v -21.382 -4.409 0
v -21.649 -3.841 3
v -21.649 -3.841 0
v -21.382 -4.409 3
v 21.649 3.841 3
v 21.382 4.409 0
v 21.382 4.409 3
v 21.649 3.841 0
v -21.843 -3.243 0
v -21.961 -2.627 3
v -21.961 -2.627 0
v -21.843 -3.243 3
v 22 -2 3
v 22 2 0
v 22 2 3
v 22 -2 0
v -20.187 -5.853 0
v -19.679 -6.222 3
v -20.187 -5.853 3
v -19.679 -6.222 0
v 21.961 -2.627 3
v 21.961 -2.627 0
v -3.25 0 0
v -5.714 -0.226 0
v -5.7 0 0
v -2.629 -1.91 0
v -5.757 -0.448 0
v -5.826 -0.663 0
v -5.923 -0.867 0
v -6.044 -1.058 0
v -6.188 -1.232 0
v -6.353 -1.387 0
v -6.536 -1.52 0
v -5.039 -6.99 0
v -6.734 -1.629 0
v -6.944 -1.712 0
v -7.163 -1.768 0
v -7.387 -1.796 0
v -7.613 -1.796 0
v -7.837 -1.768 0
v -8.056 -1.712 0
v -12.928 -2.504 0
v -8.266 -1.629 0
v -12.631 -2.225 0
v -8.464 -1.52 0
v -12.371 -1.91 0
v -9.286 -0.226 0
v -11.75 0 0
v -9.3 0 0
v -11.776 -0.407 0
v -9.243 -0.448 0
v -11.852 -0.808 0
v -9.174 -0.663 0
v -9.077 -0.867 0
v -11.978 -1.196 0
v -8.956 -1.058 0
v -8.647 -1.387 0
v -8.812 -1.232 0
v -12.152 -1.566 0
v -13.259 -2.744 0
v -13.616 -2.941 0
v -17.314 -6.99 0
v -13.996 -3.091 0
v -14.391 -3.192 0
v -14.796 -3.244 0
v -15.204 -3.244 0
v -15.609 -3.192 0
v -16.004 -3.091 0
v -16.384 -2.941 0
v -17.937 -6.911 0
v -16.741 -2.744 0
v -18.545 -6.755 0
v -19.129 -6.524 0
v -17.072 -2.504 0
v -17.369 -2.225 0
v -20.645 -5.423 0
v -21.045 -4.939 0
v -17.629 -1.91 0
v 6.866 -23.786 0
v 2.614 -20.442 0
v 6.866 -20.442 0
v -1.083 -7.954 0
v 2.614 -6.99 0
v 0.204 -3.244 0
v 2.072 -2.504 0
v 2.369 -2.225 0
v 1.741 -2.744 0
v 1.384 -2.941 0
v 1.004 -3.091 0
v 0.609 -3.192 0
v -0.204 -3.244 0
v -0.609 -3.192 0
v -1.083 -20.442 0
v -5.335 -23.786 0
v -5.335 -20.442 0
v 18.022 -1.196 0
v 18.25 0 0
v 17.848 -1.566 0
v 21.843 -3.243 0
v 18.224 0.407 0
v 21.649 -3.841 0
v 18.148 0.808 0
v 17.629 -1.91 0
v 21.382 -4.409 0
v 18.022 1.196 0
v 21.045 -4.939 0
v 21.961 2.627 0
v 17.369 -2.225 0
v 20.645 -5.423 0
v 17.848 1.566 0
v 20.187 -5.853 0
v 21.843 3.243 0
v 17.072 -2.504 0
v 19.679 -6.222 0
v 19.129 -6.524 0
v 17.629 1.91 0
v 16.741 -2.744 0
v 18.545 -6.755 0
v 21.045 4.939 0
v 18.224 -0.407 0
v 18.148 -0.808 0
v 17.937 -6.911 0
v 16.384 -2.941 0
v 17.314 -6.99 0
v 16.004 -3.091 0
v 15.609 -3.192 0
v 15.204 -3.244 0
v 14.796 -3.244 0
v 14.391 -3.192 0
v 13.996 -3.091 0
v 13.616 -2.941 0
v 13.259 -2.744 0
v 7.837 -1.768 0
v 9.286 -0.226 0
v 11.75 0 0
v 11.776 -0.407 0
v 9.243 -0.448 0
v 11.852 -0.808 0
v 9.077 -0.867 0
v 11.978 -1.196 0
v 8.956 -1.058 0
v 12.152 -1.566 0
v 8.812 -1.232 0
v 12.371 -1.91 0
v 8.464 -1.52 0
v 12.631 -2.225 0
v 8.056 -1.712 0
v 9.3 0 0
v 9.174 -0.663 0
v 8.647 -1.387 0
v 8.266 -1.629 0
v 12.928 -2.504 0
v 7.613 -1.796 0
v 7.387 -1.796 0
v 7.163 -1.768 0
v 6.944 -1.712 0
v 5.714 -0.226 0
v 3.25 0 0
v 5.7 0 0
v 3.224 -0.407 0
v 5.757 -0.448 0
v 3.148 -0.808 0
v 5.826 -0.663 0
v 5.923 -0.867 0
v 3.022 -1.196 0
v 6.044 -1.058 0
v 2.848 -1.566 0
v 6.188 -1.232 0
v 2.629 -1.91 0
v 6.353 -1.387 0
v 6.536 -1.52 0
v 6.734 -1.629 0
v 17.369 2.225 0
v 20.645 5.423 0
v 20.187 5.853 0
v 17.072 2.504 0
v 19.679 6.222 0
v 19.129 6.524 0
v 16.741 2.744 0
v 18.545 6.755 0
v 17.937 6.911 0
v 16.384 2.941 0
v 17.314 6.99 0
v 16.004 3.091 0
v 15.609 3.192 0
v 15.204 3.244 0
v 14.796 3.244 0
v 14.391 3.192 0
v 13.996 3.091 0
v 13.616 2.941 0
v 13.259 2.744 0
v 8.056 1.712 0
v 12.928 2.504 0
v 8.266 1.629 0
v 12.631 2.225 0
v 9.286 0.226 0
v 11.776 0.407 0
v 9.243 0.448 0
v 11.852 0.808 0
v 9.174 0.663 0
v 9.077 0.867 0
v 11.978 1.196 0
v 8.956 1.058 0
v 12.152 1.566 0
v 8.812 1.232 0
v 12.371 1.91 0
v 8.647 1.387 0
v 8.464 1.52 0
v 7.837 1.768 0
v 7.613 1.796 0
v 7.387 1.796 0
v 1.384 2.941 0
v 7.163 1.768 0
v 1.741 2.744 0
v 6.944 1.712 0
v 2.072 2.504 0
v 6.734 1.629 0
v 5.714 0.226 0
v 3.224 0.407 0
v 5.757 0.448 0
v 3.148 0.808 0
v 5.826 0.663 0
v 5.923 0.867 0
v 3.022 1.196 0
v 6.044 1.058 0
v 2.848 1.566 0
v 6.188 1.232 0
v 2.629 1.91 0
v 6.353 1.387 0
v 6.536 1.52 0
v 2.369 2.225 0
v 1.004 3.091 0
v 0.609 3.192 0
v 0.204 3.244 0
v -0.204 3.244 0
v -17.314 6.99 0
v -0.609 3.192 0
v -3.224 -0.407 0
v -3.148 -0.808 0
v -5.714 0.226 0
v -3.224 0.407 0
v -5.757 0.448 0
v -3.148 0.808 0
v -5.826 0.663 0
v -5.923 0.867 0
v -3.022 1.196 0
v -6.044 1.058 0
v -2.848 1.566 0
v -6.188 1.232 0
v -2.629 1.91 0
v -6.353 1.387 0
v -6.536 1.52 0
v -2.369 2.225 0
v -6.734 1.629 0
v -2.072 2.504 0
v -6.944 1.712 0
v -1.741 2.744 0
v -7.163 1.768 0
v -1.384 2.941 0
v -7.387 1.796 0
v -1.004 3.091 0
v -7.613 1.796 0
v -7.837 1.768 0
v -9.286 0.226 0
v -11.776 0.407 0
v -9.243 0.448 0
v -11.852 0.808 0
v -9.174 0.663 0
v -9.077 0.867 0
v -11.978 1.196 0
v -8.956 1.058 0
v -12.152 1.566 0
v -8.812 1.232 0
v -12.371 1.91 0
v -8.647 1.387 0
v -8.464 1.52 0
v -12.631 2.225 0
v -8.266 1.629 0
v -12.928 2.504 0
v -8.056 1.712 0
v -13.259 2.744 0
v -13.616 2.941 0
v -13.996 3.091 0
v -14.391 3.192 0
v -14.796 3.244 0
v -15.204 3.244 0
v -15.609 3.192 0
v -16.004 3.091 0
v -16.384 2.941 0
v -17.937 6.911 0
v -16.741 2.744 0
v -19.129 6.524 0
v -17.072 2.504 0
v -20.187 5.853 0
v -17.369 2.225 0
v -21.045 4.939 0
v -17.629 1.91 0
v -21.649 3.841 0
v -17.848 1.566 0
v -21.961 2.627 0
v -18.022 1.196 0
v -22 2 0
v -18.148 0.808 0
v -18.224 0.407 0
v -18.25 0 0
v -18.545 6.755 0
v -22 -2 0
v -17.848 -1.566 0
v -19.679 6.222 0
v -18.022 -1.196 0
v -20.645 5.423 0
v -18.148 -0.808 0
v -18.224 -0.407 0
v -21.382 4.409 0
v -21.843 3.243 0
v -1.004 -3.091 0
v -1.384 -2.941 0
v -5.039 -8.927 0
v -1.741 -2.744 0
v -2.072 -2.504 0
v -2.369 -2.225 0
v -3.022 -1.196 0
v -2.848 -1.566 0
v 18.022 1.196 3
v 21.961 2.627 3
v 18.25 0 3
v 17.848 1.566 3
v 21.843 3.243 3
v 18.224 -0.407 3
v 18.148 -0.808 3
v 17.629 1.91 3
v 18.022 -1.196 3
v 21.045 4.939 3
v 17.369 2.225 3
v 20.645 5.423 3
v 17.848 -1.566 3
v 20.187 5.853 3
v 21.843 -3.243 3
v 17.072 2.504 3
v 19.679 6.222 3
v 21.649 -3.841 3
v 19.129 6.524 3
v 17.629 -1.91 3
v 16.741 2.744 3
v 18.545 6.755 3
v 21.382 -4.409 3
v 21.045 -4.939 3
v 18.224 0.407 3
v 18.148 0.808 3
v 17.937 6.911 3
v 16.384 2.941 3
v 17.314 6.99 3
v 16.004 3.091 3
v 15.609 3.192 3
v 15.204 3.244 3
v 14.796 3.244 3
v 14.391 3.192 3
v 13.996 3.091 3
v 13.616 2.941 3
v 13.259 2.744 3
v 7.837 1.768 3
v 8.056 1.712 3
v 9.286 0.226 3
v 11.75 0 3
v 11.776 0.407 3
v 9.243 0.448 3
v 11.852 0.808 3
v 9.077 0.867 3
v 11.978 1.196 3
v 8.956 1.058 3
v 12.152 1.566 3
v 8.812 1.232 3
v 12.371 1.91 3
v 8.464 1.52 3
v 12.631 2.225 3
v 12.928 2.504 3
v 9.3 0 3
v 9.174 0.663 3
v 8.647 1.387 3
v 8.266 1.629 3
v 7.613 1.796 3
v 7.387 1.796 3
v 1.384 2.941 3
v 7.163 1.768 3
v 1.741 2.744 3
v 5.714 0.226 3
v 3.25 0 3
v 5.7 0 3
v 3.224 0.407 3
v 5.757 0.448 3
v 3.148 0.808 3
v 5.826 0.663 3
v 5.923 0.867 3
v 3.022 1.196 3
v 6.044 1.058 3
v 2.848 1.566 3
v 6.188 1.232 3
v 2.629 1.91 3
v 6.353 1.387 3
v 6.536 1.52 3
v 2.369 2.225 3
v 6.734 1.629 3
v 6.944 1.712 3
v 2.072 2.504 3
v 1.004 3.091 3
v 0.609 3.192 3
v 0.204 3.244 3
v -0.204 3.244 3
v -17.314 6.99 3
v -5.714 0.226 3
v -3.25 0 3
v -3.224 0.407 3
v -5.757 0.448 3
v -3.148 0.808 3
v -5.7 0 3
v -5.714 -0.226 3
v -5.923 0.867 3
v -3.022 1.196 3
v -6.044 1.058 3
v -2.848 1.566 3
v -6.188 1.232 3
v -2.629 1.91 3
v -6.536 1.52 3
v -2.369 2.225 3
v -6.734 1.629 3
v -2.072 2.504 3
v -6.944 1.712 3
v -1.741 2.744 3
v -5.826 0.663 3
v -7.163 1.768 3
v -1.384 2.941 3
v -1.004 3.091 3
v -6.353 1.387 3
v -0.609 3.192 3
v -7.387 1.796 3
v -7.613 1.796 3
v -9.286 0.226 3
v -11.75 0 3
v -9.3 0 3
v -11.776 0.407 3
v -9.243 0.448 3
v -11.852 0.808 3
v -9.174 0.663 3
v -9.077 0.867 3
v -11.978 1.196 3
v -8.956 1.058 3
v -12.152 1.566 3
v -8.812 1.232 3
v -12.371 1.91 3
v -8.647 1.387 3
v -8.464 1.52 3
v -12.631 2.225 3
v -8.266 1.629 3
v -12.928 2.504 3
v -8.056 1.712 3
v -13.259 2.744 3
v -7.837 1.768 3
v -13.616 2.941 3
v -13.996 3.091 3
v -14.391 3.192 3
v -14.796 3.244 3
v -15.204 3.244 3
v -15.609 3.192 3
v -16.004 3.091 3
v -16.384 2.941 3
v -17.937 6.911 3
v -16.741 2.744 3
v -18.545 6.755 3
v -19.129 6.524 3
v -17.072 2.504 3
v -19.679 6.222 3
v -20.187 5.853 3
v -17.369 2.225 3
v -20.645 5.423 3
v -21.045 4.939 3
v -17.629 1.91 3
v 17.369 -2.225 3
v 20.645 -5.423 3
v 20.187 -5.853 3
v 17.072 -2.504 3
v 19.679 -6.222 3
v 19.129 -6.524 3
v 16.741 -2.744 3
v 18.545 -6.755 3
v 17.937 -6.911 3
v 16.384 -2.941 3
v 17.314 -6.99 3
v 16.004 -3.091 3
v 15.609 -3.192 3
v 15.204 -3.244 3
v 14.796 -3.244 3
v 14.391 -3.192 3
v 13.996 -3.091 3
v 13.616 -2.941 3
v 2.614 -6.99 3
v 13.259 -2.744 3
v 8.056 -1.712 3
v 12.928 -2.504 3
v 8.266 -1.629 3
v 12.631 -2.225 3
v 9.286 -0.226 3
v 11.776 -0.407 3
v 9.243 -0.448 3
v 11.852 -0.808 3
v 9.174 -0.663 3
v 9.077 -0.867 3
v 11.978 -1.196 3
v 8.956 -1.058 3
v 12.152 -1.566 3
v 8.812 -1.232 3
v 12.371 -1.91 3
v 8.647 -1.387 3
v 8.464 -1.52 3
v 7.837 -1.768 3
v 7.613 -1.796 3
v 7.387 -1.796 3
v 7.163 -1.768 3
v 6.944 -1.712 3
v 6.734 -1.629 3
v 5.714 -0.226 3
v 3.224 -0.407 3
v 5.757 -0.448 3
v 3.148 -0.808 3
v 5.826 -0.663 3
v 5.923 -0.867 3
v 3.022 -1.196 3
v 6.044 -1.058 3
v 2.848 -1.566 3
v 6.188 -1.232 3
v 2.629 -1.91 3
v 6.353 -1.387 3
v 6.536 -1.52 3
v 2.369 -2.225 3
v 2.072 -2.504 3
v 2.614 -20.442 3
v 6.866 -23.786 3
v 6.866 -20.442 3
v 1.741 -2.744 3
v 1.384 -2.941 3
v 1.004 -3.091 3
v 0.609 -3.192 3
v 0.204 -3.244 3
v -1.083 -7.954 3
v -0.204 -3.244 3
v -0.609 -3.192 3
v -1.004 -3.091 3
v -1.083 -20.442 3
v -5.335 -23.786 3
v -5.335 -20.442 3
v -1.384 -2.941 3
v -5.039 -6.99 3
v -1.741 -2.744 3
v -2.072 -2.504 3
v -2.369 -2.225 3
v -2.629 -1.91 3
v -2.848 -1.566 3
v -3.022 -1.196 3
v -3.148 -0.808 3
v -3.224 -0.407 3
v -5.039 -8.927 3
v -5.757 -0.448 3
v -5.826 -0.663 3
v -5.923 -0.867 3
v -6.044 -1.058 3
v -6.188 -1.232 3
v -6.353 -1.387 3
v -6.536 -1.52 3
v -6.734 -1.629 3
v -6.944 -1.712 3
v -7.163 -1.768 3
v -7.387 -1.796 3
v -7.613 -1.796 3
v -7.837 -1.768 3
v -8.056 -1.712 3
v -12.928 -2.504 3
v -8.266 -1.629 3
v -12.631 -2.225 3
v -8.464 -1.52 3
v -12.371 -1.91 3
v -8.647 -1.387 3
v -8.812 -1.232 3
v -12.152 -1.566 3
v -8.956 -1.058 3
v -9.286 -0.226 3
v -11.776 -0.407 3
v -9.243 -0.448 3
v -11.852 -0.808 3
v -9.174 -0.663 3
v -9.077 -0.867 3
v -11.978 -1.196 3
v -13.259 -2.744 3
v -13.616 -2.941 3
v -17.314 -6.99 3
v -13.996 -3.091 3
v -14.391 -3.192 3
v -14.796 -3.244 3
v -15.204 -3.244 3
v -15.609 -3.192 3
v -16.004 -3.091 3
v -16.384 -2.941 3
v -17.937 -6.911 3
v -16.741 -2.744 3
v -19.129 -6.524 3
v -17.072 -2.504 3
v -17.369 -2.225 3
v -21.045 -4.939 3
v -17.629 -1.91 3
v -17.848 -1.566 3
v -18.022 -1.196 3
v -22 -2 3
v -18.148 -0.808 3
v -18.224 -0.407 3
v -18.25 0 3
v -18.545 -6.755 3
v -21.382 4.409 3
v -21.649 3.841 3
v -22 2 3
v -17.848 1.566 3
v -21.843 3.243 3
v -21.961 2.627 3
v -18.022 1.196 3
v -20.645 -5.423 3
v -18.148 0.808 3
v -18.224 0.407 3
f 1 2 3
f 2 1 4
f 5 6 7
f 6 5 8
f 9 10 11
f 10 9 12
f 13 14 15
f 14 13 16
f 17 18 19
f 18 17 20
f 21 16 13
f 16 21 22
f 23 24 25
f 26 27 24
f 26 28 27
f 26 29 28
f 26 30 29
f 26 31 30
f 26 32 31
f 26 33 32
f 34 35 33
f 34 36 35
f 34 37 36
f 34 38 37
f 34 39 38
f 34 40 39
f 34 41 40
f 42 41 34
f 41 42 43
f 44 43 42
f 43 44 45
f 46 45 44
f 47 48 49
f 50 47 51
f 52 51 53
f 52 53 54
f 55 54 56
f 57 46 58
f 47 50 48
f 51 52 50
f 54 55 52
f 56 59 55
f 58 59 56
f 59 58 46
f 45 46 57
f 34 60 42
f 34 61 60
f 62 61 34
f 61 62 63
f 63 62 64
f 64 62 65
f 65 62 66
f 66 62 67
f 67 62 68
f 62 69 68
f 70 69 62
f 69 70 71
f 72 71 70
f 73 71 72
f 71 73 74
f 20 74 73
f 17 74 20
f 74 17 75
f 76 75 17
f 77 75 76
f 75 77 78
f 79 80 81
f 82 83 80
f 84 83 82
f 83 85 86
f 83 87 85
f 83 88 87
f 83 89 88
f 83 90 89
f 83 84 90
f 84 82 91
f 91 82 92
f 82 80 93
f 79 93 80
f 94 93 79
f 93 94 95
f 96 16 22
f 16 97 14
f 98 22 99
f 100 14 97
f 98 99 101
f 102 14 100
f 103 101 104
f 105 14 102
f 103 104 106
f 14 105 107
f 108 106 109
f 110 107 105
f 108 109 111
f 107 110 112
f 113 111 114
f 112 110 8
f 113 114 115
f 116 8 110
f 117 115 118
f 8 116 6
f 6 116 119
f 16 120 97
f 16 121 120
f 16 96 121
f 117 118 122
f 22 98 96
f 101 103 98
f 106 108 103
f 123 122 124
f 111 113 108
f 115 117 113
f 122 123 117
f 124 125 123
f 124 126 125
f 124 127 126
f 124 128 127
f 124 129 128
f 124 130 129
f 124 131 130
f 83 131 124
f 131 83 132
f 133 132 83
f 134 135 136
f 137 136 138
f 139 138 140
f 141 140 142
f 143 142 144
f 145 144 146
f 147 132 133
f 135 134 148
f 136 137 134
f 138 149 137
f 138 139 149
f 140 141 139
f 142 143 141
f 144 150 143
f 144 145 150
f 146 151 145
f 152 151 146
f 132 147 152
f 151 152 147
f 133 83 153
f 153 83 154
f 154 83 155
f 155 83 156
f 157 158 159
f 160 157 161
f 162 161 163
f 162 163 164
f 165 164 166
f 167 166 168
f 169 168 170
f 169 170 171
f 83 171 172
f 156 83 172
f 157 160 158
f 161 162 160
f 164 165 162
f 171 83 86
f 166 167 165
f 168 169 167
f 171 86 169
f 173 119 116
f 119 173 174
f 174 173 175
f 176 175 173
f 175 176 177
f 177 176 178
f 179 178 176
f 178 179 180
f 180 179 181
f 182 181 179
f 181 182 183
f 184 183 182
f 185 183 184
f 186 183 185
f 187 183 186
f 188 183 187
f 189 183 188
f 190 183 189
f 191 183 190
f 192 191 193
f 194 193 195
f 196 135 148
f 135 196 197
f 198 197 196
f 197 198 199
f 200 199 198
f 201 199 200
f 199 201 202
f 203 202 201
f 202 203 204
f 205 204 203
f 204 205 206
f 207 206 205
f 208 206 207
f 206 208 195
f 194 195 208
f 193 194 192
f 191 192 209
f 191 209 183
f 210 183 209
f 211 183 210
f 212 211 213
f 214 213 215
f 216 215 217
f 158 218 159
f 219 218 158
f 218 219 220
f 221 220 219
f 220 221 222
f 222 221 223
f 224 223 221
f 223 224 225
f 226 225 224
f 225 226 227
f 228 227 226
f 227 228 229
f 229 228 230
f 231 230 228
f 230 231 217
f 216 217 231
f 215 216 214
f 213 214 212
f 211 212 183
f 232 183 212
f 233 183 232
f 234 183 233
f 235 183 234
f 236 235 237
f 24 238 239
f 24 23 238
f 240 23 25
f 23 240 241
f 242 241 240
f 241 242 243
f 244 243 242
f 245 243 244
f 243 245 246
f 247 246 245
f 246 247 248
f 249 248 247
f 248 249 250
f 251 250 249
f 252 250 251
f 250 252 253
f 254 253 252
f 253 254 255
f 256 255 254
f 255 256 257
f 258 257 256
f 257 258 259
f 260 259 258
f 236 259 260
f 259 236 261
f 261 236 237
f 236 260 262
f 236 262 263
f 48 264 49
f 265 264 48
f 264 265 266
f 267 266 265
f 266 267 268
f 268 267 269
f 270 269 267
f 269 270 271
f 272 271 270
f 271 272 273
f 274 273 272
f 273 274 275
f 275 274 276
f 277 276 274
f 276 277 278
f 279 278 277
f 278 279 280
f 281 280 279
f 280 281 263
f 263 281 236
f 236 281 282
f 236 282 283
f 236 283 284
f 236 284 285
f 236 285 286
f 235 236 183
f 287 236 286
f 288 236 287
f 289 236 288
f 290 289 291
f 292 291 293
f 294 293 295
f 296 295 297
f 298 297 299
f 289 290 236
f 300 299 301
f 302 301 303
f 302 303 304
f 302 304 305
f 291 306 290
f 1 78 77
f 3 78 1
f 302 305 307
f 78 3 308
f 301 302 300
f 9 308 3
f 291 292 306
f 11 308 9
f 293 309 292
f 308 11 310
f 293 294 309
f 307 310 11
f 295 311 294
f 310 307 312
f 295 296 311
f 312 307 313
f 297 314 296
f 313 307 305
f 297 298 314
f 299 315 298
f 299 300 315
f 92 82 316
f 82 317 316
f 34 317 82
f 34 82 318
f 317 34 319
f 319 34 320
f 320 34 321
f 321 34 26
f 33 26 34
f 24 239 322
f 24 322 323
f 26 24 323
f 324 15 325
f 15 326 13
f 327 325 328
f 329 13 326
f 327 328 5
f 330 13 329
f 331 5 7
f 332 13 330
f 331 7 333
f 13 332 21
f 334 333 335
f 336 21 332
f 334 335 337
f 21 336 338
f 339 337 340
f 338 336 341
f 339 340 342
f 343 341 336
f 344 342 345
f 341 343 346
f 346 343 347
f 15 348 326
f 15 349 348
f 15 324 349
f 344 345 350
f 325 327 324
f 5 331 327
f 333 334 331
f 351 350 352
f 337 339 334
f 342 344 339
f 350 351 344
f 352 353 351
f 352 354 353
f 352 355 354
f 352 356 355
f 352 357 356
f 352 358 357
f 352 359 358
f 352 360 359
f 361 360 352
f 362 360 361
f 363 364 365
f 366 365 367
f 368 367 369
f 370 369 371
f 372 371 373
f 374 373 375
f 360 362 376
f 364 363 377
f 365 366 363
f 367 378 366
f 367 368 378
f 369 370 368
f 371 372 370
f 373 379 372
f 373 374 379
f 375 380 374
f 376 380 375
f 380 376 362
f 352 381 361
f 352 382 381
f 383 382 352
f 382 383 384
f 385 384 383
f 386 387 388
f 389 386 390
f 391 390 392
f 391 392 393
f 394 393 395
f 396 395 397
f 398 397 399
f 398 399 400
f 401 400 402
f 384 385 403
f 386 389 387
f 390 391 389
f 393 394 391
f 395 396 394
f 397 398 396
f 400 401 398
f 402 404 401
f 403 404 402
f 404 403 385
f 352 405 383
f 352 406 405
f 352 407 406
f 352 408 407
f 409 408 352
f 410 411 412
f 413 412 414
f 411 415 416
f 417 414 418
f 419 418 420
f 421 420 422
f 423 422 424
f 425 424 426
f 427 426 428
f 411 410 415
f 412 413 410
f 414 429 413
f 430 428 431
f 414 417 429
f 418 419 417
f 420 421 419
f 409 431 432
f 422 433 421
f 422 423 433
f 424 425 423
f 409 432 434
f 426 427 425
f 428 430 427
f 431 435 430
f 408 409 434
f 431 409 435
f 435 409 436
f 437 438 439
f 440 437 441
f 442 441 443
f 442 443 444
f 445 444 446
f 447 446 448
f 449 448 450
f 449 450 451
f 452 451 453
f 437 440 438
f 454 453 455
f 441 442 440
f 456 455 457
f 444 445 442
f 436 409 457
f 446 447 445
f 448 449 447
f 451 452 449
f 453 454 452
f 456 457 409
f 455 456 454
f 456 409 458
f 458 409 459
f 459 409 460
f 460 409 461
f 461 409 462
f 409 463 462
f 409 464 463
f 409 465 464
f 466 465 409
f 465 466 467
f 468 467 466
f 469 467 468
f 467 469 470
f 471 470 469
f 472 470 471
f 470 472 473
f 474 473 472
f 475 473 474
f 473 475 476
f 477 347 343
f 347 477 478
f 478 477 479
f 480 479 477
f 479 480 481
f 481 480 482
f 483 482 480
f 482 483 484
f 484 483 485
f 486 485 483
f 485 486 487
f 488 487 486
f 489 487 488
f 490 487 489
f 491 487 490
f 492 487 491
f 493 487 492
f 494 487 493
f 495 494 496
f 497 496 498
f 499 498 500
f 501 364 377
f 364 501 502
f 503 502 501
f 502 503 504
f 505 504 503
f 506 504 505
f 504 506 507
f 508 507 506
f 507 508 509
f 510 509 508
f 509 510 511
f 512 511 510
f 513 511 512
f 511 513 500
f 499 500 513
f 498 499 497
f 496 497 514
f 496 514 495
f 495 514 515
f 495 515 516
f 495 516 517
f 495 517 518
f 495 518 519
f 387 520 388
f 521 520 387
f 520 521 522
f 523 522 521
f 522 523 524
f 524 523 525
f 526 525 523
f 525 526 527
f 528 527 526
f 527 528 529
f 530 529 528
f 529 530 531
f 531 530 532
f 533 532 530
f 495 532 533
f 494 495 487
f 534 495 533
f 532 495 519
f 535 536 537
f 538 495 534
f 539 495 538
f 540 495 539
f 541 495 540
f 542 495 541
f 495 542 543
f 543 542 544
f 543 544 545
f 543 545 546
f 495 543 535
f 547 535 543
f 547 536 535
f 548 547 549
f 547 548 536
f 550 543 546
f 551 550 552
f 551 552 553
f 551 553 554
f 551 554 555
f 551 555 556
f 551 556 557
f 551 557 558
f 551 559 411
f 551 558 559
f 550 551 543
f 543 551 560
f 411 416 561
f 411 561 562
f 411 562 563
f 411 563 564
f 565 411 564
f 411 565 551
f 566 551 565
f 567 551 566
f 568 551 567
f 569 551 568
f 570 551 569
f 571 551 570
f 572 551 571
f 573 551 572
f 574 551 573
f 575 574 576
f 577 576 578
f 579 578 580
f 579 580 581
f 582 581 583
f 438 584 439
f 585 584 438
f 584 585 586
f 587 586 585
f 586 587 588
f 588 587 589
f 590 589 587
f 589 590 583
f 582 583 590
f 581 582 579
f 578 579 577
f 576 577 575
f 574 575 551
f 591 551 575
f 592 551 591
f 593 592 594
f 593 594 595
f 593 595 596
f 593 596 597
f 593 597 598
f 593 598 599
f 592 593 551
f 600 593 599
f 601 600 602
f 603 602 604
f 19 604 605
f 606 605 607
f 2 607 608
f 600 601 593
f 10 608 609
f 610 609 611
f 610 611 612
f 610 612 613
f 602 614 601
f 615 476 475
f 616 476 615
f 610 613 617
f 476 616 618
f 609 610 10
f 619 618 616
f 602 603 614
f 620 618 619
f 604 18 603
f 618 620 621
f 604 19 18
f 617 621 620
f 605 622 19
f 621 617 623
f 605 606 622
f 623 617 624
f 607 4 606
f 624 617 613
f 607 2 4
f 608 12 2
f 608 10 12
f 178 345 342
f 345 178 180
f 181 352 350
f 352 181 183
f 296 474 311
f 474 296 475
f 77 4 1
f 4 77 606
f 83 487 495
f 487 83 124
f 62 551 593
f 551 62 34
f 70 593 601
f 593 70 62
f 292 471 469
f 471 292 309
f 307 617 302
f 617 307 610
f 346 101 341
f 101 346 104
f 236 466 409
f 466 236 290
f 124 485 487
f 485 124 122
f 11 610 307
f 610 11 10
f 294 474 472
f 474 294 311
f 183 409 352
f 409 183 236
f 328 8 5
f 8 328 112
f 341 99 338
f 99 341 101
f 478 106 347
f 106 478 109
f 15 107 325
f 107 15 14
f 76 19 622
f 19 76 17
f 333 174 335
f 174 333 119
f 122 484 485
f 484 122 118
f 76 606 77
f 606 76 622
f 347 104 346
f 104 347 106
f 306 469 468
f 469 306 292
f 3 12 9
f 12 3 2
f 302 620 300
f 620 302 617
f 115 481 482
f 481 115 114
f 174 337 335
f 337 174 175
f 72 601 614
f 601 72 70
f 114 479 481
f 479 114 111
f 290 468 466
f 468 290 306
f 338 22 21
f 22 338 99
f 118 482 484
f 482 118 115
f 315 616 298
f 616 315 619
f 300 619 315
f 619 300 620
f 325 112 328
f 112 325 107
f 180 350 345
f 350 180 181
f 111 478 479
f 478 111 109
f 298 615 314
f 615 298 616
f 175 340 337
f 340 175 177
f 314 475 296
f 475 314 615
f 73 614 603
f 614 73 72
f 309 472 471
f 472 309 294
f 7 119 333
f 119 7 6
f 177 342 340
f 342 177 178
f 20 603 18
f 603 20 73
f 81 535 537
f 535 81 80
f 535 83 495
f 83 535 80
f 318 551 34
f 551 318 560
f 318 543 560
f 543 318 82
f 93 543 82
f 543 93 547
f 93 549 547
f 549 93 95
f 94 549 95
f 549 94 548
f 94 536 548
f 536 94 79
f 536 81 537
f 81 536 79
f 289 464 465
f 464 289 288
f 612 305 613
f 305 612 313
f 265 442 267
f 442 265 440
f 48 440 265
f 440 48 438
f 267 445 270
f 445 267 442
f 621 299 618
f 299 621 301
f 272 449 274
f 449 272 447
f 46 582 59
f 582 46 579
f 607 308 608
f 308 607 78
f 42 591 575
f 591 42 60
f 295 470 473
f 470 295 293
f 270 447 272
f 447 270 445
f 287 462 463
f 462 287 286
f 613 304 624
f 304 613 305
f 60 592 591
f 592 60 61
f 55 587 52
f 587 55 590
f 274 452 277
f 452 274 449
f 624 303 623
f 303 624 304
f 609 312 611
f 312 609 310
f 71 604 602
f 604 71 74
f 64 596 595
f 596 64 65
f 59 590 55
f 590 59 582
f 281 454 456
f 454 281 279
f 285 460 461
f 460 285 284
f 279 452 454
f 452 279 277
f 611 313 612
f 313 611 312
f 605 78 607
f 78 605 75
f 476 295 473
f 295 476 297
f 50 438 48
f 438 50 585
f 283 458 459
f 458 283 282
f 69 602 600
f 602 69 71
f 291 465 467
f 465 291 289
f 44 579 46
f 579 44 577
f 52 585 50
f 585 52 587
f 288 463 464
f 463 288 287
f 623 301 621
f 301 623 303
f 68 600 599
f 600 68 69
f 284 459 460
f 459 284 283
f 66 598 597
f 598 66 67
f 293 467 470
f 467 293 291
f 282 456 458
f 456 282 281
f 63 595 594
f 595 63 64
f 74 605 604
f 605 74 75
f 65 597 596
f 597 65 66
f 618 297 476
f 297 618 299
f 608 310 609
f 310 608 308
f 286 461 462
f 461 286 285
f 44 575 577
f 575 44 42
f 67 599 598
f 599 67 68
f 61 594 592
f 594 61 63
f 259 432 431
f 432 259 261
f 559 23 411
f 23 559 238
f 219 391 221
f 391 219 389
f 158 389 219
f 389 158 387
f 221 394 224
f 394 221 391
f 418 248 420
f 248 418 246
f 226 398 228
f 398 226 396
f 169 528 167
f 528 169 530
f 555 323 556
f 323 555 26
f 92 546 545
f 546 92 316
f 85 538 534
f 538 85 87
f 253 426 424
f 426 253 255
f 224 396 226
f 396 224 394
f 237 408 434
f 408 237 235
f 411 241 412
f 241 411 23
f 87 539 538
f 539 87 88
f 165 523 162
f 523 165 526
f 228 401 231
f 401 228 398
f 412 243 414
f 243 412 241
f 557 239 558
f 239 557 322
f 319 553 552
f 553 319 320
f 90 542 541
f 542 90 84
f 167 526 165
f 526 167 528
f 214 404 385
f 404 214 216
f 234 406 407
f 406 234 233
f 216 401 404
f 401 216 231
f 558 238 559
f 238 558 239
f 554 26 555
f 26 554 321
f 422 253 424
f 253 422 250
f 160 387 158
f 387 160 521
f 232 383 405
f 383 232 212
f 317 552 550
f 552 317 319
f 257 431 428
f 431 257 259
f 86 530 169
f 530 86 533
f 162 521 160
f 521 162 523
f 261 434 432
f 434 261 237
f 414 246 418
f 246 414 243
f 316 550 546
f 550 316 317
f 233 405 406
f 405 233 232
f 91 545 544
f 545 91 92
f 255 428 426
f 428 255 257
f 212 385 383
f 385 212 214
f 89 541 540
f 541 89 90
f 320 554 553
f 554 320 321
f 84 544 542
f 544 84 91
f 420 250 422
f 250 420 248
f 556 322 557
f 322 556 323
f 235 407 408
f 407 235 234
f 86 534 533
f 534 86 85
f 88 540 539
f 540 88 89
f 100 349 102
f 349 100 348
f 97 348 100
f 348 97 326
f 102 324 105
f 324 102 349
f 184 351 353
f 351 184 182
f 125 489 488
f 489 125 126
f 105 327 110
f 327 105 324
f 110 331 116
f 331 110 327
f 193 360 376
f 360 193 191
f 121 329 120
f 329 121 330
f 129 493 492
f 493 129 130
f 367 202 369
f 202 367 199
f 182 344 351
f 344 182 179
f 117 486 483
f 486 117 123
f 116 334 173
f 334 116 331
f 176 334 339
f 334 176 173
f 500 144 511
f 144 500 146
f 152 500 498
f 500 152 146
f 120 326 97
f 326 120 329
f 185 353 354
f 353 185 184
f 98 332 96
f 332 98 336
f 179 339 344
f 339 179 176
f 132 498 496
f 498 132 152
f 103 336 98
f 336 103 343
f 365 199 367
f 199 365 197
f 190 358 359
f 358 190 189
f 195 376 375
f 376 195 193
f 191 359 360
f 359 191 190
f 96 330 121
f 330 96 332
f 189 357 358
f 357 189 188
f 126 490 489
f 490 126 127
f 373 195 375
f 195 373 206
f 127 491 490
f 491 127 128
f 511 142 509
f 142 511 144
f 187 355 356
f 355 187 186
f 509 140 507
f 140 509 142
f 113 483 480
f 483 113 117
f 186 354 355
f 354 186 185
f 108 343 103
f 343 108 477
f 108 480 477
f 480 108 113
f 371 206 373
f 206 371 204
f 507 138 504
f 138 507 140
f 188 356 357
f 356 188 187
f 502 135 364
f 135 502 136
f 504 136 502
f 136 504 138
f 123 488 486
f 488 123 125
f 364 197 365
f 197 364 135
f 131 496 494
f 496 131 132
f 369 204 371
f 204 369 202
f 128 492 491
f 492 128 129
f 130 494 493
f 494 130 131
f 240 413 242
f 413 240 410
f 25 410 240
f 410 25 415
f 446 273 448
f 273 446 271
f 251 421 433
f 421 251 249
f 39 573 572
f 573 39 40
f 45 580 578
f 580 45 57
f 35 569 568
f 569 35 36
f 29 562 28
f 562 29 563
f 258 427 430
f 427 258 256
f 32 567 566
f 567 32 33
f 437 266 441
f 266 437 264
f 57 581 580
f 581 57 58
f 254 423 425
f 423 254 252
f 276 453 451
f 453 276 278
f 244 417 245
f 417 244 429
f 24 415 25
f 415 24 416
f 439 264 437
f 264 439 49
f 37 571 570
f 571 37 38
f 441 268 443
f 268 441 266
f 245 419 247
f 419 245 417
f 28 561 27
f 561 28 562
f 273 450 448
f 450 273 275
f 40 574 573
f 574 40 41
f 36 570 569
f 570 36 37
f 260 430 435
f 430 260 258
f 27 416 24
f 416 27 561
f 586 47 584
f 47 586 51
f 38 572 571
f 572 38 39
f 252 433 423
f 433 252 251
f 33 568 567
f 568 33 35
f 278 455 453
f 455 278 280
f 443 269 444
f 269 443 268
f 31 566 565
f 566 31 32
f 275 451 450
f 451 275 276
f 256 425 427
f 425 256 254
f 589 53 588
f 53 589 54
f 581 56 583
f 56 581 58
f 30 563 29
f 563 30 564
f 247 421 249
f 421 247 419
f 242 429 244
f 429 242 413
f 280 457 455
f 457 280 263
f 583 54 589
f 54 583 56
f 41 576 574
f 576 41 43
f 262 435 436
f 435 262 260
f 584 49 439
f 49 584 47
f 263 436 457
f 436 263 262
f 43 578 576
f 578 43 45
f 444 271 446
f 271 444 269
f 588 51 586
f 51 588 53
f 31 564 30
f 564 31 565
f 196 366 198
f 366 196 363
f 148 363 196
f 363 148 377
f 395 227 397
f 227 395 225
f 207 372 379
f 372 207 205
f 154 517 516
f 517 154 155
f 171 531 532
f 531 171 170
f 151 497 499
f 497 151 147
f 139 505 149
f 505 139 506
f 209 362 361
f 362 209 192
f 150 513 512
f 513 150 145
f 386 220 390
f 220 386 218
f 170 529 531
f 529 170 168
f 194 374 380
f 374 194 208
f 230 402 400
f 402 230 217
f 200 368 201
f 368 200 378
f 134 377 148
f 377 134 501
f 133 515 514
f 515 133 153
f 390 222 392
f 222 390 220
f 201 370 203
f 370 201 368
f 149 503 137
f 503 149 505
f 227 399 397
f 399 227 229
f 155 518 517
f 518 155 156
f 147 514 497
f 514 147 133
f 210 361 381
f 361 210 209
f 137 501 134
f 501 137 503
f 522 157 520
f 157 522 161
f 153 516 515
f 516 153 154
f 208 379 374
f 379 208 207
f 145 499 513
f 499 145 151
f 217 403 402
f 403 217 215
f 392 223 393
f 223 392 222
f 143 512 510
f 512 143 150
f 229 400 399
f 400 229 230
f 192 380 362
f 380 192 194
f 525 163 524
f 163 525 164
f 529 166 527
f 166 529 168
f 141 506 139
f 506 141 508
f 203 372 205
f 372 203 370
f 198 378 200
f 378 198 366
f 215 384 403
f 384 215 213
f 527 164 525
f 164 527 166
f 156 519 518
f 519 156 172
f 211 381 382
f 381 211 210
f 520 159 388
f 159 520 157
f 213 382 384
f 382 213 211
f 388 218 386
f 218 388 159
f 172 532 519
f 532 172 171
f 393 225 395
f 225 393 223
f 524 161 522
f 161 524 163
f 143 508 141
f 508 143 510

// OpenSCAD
$fn = 50;


difference() {
	union() {
		hull() {
			translate(v = [-17.0000000000, 2.0000000000, 0]) {
				cylinder(h = 3, r = 5);
			}
			translate(v = [17.0000000000, 2.0000000000, 0]) {
				cylinder(h = 3, r = 5);
			}
			translate(v = [-17.0000000000, -2.0000000000, 0]) {
				cylinder(h = 3, r = 5);
			}
			translate(v = [17.0000000000, -2.0000000000, 0]) {
				cylinder(h = 3, r = 5);
			}
		}
		translate(v = [0, -5, 0]) {
			linear_extrude(height = 3) {
				text(font = "DejaVu Sans Mono:style=Bold", halign = "center", size = 19.0000000000, text = "1", valign = "top");
			}
		}
	}
	union() {
		translate(v = [-15.0000000000, 0.0000000000, 0]) {
			translate(v = [0, 0, -100]) {
				cylinder(h = 200, r = 3.2500000000);
			}
		}
		translate(v = [0, 0, -100]) {
			cylinder(h = 200, r = 3.2500000000);
		}
		translate(v = [15.0000000000, 0.0000000000, 0]) {
			translate(v = [0, 0, -100]) {
				cylinder(h = 200, r = 3.2500000000);
			}
		}
		translate(v = [-15.0000000000, 0.0000000000, 0]) {
			translate(v = [0, 0, -100]) {
				cylinder(h = 200, r = 1.8000000000);
			}
		}
		translate(v = [-7.5000000000, 0.0000000000, 0]) {
			translate(v = [0, 0, -100]) {
				cylinder(h = 200, r = 1.8000000000);
			}
		}
		translate(v = [0, 0, -100]) {
			cylinder(h = 200, r = 1.8000000000);
		}
		translate(v = [7.5000000000, 0.0000000000, 0]) {
			translate(v = [0, 0, -100]) {
				cylinder(h = 200, r = 1.8000000000);
			}
		}
		translate(v = [15.0000000000, 0.0000000000, 0]) {
			translate(v = [0, 0, -100]) {
				cylinder(h = 200, r = 1.8000000000);
			}
		}
	}
}
